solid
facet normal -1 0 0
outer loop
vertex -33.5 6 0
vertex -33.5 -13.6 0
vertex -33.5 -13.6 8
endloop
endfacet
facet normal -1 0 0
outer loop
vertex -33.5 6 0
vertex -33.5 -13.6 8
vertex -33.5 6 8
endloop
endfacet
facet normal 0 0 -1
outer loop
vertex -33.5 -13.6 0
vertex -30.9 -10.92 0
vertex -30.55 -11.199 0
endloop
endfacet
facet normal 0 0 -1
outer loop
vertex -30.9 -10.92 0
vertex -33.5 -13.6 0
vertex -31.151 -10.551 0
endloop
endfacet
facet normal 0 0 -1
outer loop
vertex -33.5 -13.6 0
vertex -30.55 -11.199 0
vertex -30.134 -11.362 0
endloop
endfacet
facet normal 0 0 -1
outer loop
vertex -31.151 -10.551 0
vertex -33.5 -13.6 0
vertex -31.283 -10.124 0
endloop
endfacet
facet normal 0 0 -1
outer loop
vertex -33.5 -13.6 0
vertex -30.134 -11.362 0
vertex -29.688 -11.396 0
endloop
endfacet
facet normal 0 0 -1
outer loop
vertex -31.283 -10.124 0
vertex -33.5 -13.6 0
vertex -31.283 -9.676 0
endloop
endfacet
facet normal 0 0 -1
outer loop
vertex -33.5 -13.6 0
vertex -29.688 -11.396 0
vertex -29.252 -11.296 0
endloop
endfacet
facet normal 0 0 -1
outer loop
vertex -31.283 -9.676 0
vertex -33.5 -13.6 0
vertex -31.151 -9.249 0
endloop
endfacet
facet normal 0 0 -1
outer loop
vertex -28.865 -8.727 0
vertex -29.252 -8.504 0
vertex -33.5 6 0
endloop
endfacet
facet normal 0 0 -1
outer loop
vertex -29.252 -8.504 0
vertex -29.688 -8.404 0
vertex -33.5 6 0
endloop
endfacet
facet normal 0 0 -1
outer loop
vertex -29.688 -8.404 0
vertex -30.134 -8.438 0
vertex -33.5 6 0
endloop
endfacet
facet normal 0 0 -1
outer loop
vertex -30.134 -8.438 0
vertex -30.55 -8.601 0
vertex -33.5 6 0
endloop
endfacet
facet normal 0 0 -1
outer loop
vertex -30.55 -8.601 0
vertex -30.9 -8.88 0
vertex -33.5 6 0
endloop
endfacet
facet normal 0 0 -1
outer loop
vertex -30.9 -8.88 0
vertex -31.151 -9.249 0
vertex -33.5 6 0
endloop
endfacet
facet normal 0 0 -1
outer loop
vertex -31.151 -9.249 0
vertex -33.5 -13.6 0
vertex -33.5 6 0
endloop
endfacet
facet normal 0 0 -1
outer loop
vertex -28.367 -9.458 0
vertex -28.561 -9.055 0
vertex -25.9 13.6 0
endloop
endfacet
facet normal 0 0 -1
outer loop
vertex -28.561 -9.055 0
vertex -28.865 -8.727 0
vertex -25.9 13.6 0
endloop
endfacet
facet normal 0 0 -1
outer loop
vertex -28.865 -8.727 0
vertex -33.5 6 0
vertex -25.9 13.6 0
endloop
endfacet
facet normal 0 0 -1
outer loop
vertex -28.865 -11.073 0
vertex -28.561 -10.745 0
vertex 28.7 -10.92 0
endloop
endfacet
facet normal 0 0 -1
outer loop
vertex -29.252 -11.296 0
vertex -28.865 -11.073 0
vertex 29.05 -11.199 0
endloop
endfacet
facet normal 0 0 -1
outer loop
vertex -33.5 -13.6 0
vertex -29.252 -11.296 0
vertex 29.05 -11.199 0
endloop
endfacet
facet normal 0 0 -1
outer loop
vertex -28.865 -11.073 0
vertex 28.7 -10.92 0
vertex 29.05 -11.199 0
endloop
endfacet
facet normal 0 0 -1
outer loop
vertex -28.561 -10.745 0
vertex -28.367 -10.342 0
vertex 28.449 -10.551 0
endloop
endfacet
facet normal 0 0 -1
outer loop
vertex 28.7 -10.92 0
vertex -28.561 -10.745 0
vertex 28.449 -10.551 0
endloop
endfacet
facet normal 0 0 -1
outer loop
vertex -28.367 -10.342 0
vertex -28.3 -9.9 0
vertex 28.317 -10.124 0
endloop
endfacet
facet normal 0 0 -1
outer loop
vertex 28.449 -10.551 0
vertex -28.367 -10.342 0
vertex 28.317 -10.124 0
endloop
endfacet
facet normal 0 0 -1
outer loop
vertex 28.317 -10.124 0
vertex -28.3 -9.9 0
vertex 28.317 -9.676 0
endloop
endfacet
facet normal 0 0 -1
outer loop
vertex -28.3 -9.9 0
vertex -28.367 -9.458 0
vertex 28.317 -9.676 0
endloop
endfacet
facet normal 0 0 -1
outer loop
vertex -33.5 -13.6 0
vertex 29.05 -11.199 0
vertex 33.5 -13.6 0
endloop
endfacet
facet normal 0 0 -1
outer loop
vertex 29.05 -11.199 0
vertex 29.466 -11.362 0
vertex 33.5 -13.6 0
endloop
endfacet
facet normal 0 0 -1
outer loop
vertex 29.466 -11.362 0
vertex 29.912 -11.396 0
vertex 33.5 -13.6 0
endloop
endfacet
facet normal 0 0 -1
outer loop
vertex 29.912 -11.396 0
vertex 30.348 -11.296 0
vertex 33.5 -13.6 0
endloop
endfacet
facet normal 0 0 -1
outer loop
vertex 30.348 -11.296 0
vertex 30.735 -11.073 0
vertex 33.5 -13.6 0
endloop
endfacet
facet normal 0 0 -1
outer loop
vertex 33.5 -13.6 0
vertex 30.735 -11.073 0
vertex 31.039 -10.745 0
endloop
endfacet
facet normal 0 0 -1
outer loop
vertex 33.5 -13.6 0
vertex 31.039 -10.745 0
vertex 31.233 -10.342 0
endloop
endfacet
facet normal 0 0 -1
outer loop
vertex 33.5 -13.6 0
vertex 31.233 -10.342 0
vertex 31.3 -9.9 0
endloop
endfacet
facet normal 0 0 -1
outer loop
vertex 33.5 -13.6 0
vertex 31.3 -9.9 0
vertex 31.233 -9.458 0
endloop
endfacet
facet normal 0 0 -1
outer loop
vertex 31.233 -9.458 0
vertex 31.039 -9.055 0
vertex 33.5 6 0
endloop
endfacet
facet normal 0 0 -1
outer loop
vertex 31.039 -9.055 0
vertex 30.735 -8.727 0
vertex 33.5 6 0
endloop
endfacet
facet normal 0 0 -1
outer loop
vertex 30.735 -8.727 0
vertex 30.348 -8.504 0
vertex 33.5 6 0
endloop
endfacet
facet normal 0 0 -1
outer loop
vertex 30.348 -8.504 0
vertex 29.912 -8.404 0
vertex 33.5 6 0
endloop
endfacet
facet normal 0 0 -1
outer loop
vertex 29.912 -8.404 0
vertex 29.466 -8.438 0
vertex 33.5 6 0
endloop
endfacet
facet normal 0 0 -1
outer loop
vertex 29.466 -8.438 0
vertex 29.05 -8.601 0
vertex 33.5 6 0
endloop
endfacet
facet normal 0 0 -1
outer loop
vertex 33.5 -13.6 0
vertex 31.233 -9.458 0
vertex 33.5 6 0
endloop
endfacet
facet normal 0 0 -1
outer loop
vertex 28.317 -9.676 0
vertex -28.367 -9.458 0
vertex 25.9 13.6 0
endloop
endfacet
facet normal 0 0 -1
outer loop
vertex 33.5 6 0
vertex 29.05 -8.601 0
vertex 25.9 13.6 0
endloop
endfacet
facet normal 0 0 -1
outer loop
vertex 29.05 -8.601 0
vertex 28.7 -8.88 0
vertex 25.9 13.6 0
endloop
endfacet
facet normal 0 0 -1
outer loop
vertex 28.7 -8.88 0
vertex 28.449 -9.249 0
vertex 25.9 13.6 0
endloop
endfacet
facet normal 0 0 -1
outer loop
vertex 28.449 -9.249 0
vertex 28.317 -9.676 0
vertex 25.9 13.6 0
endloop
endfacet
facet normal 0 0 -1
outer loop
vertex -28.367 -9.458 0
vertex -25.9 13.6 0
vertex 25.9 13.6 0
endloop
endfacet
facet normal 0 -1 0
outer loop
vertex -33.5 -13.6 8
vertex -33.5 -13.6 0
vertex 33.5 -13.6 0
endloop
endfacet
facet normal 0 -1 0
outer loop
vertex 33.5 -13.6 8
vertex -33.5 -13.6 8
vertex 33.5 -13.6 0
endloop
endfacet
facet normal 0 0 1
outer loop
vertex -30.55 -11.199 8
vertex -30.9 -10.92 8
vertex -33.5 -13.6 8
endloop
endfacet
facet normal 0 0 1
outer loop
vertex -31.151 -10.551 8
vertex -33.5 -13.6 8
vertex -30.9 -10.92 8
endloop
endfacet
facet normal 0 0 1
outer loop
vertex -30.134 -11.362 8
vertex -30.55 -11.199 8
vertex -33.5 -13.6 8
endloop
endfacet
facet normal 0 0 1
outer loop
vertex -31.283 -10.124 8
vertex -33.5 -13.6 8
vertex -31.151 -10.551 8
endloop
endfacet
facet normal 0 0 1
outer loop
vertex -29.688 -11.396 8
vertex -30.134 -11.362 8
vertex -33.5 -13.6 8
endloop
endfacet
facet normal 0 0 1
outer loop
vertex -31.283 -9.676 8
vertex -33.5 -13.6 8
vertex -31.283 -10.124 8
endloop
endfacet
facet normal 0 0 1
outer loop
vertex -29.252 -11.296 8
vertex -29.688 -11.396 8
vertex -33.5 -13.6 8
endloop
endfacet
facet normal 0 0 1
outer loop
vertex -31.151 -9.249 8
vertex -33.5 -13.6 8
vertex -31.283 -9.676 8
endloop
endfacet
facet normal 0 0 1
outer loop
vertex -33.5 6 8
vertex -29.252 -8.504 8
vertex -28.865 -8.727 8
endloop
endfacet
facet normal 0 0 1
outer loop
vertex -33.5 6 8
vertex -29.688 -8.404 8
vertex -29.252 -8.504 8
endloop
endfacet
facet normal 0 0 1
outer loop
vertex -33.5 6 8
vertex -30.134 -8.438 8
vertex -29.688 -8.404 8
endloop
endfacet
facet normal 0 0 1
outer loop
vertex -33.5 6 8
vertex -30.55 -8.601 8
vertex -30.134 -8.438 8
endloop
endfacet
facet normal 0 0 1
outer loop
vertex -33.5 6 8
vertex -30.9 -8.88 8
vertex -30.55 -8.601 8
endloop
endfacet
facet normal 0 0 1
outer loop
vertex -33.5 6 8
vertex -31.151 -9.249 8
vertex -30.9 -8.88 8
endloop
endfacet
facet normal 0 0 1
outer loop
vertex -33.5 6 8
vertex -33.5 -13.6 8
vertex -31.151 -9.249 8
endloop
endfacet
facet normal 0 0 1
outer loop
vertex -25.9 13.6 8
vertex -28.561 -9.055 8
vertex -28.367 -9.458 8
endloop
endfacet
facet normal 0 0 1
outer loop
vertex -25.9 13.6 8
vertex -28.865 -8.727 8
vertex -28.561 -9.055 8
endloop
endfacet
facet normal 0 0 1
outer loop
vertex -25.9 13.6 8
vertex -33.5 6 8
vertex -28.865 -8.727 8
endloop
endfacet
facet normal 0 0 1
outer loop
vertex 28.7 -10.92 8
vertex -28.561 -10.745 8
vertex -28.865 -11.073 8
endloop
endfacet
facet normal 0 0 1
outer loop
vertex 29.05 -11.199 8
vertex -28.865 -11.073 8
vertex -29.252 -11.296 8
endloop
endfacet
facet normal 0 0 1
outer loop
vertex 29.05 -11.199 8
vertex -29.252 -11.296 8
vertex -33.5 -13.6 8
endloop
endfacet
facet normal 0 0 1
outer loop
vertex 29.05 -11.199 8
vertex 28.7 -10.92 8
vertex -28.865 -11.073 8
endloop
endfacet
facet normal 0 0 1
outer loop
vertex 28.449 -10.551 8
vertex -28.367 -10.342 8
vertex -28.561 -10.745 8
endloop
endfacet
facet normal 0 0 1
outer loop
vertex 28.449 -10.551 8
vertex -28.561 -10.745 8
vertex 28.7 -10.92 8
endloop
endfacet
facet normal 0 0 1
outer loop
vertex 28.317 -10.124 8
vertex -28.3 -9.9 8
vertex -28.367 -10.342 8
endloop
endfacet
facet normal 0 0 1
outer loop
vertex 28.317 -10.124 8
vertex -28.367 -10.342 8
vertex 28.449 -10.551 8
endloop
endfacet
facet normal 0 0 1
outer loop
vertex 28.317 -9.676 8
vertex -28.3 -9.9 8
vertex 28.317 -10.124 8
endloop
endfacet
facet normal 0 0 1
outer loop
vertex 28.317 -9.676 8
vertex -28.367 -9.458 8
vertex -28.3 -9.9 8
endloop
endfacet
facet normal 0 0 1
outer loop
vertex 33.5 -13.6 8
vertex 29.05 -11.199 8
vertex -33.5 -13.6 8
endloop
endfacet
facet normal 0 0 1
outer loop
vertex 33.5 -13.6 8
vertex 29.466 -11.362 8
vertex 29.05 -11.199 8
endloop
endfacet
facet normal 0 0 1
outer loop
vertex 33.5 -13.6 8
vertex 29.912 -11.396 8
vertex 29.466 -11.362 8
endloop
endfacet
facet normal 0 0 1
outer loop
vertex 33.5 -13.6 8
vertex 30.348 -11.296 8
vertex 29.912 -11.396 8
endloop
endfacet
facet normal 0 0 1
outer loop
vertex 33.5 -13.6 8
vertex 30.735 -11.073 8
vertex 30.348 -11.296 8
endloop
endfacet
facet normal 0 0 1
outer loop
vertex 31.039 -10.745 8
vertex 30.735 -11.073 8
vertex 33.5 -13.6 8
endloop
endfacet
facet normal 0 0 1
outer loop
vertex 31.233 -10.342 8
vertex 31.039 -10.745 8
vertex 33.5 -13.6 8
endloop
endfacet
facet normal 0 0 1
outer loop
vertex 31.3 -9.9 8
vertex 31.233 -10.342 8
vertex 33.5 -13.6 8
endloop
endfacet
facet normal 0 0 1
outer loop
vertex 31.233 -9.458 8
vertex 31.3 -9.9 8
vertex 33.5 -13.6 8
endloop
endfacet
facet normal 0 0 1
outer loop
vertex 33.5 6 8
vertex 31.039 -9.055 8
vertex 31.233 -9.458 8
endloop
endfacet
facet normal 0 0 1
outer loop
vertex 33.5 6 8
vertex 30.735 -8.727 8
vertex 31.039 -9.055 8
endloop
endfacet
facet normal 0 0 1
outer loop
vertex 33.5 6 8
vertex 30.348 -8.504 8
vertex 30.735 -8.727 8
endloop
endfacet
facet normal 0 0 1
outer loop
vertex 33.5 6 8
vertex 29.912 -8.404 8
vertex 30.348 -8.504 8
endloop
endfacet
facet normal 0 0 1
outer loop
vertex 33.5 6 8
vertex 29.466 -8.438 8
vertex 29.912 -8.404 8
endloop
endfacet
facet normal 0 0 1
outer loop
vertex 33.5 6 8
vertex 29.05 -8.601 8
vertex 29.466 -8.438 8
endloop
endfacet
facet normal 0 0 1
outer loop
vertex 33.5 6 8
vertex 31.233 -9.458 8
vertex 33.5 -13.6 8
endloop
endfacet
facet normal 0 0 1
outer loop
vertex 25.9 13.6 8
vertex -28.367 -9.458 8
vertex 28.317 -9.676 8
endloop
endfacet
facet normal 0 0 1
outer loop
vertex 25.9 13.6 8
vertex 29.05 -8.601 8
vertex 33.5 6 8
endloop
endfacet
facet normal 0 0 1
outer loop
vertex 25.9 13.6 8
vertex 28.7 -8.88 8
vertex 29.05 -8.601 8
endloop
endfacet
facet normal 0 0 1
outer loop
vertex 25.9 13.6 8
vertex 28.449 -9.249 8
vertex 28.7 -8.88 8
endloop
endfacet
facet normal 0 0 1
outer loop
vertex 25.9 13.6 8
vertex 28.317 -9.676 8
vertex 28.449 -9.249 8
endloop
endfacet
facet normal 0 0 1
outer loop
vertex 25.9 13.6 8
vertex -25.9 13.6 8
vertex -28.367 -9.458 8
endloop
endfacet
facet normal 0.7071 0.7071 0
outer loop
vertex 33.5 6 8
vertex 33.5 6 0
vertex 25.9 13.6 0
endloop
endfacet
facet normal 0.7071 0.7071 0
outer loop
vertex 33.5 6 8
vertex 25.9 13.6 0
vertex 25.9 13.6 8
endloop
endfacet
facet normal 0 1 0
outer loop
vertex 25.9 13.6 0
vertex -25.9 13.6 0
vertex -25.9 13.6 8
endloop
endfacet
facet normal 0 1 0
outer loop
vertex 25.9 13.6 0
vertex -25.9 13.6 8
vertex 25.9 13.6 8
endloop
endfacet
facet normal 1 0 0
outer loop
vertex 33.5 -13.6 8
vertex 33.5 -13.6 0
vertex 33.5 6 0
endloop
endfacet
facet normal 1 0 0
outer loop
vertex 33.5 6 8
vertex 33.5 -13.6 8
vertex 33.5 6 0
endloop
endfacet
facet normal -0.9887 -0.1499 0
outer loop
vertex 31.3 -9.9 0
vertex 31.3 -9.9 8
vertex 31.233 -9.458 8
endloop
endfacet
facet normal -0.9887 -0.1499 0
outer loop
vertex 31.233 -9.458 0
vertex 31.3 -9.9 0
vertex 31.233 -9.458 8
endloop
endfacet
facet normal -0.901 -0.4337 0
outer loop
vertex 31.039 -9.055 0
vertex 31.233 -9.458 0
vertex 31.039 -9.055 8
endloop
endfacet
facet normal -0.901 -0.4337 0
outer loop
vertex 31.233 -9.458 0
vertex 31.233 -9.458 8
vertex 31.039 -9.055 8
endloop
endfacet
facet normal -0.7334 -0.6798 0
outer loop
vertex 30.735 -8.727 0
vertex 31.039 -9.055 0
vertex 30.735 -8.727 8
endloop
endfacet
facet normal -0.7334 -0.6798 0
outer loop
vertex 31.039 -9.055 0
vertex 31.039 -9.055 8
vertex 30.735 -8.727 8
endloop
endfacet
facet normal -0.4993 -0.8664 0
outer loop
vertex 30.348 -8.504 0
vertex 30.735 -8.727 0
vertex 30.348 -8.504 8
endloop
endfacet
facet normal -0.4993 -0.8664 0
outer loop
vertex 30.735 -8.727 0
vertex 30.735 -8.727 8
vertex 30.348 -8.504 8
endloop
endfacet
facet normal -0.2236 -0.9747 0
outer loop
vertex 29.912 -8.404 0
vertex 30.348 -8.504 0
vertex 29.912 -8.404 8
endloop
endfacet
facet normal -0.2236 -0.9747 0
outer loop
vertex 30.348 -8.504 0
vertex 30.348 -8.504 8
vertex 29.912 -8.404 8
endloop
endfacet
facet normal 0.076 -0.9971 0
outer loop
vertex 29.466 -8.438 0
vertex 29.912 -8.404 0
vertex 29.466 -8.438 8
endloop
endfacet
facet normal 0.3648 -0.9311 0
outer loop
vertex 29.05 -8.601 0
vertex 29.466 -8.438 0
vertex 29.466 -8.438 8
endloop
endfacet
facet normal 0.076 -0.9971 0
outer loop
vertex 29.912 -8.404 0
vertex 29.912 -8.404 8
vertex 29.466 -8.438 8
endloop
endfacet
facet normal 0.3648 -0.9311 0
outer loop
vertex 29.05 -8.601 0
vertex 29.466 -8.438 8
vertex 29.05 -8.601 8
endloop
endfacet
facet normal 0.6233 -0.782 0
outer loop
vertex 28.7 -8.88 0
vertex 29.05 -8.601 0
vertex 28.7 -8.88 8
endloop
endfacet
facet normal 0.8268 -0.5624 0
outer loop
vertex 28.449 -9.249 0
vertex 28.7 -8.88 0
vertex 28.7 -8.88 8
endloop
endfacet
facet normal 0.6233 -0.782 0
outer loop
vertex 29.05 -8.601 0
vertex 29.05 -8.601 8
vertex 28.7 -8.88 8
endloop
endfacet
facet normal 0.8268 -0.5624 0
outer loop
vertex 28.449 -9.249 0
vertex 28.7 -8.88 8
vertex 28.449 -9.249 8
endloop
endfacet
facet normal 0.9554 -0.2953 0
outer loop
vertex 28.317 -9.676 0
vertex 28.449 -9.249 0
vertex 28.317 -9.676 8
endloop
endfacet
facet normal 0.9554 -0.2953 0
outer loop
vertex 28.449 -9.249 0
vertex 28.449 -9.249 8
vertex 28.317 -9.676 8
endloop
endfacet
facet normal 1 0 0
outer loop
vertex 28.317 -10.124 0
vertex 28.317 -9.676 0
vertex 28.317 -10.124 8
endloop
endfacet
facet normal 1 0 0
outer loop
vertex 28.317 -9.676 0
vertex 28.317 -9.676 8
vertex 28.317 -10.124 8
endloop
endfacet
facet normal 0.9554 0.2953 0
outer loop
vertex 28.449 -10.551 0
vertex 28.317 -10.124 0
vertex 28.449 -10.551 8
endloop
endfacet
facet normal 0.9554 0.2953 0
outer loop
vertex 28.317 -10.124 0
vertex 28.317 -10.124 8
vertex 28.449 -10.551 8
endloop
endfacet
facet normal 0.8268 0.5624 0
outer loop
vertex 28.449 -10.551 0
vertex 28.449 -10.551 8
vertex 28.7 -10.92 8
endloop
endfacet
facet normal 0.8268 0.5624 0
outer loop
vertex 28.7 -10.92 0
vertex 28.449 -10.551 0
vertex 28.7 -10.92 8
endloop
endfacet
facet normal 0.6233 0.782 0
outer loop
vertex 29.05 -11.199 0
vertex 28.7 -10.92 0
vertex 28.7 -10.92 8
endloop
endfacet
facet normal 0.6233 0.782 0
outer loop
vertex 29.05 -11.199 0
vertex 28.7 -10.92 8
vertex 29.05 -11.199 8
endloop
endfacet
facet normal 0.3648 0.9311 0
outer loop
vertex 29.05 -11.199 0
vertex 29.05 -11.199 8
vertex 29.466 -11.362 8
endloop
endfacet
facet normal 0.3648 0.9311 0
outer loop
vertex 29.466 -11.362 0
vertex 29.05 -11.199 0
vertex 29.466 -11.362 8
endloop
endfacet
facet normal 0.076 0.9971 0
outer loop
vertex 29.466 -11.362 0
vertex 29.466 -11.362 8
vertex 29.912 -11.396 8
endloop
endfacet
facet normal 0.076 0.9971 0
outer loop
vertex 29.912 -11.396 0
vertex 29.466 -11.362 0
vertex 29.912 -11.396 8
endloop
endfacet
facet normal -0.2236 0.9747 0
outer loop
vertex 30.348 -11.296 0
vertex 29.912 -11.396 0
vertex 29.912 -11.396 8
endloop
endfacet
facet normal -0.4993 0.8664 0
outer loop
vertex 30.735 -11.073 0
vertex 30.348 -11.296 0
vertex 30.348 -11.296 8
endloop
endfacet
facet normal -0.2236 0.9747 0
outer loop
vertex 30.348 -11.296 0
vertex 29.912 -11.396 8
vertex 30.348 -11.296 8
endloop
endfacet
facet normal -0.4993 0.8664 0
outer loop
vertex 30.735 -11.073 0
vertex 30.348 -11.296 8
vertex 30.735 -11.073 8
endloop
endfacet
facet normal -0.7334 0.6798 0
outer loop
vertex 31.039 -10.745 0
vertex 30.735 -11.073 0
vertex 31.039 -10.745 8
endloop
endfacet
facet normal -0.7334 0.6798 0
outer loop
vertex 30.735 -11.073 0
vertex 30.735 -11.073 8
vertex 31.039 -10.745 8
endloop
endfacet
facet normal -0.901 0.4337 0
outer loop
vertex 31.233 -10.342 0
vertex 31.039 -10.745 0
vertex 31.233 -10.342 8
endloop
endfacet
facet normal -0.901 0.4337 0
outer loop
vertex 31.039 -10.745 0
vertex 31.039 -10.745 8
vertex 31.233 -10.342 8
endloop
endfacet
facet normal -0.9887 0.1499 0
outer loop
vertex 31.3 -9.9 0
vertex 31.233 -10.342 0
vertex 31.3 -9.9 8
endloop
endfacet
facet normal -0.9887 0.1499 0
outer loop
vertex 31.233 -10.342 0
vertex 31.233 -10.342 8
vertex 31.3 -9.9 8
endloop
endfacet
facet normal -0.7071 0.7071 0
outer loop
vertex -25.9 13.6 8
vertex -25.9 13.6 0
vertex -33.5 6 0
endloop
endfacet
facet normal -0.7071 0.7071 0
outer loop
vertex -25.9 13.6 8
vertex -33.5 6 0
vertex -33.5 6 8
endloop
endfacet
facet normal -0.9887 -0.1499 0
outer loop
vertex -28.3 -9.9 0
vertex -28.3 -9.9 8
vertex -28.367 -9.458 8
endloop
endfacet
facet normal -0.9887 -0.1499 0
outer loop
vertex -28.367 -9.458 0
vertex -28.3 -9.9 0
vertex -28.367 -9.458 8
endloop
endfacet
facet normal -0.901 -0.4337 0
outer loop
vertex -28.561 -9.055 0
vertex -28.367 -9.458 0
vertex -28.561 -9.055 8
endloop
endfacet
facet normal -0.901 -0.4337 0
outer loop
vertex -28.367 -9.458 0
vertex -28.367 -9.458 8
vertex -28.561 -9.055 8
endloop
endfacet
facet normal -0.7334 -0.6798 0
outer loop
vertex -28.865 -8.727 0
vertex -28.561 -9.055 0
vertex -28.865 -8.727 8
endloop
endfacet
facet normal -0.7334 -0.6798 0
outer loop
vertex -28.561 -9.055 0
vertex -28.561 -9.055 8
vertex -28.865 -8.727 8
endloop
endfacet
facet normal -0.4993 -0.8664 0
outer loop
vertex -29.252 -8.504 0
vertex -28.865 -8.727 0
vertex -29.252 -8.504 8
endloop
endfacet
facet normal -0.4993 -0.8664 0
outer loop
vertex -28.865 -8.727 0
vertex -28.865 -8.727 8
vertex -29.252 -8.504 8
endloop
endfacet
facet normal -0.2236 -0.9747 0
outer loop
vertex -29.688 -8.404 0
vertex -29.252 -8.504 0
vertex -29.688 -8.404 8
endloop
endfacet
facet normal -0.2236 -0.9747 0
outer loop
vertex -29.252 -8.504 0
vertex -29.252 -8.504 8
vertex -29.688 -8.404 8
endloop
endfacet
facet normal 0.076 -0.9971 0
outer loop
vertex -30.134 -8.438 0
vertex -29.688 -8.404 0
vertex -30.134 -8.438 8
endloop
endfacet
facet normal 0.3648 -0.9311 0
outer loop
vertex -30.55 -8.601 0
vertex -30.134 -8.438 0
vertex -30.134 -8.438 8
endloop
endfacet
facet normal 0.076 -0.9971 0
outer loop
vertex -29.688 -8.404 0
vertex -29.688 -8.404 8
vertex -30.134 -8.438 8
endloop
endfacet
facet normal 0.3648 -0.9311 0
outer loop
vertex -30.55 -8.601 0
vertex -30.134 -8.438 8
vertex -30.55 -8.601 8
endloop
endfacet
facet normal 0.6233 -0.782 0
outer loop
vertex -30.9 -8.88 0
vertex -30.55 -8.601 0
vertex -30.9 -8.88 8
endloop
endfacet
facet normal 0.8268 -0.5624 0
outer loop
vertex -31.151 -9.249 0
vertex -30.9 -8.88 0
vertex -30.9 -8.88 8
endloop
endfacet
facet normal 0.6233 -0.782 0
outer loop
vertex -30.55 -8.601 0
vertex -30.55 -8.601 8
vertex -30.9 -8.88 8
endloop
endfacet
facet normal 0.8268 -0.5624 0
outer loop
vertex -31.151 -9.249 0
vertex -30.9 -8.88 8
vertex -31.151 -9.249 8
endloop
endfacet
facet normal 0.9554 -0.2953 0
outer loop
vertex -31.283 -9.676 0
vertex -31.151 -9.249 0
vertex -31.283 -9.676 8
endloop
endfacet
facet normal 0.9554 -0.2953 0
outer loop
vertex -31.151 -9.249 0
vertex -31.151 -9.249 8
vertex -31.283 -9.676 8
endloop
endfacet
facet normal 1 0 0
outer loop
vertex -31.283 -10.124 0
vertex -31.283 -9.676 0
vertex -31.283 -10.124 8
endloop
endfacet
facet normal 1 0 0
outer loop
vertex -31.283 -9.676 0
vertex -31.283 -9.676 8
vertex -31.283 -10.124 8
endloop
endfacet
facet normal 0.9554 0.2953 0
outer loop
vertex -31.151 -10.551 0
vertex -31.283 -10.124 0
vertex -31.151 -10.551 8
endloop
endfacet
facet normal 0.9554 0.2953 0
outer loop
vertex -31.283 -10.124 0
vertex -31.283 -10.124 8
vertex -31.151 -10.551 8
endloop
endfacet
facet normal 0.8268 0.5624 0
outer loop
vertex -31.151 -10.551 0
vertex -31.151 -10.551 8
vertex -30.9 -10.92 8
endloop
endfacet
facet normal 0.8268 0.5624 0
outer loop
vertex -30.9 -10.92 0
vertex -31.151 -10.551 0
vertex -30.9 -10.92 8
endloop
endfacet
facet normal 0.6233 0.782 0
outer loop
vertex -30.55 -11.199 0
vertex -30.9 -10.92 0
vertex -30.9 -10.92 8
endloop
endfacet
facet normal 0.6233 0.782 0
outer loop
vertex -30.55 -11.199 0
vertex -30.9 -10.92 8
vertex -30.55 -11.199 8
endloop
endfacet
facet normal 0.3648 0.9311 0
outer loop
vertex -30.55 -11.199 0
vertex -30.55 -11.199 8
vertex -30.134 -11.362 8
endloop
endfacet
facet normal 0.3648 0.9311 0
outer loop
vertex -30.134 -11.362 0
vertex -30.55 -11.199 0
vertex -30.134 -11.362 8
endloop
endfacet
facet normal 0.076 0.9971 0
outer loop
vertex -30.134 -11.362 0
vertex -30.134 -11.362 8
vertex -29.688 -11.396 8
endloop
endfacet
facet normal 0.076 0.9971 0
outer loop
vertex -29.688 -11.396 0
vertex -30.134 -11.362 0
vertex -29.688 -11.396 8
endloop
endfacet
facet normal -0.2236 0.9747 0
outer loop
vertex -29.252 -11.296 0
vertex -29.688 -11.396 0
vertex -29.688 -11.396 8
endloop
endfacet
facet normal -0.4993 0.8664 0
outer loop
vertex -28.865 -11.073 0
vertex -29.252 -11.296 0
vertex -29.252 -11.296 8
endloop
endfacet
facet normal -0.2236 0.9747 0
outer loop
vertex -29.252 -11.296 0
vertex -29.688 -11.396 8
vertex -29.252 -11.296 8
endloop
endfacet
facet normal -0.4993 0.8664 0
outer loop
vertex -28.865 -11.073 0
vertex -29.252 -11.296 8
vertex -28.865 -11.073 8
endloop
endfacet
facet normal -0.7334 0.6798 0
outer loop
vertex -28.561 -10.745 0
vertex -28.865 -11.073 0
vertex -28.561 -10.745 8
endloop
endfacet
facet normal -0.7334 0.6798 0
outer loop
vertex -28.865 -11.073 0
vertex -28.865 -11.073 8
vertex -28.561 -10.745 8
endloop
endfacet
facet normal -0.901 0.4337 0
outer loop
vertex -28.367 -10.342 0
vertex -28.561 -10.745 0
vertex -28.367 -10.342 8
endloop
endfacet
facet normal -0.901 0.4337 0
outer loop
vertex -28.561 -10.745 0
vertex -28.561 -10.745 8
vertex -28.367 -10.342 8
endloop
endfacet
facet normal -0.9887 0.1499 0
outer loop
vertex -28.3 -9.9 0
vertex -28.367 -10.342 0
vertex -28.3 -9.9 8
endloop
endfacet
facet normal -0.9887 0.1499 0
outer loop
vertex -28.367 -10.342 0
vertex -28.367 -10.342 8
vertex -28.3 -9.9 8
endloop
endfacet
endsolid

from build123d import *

# Parameters (mm, degrees)
SKETCH1_W           = 67
SKETCH1_H           = 27.2
BOSS_EXTRUDE1_DEPTH = 8
SKETCH3_R           = 1.5
CUT_EXTRUDE1_DEPTH  = 8
CHAMFER1_SIZE       = 7.6


with BuildPart() as part:
    # Sketch1 → Boss-Extrude1 (new body)
    with BuildSketch(Plane.XY):
        Rectangle(SKETCH1_W, SKETCH1_H)
    extrude(amount=BOSS_EXTRUDE1_DEPTH)

    # Sketch3 → Cut-Extrude1 (cut)
    with BuildSketch(Plane.XY.offset(8)):
        with Locations((29.8, -9.9)):
            Circle(SKETCH3_R)
        with Locations((-29.8, -9.9)):
            Circle(SKETCH3_R)
    extrude(amount=-CUT_EXTRUDE1_DEPTH, mode=Mode.SUBTRACT)

    # Chamfer1
    chamfer1_edges = [part.edges().sort_by_distance(p)[0] for p in [
        (-33.5, 13.6, 4),
        (33.5, 13.6, 4),
    ]]
    chamfer(chamfer1_edges, length=CHAMFER1_SIZE)


solid = part.part
